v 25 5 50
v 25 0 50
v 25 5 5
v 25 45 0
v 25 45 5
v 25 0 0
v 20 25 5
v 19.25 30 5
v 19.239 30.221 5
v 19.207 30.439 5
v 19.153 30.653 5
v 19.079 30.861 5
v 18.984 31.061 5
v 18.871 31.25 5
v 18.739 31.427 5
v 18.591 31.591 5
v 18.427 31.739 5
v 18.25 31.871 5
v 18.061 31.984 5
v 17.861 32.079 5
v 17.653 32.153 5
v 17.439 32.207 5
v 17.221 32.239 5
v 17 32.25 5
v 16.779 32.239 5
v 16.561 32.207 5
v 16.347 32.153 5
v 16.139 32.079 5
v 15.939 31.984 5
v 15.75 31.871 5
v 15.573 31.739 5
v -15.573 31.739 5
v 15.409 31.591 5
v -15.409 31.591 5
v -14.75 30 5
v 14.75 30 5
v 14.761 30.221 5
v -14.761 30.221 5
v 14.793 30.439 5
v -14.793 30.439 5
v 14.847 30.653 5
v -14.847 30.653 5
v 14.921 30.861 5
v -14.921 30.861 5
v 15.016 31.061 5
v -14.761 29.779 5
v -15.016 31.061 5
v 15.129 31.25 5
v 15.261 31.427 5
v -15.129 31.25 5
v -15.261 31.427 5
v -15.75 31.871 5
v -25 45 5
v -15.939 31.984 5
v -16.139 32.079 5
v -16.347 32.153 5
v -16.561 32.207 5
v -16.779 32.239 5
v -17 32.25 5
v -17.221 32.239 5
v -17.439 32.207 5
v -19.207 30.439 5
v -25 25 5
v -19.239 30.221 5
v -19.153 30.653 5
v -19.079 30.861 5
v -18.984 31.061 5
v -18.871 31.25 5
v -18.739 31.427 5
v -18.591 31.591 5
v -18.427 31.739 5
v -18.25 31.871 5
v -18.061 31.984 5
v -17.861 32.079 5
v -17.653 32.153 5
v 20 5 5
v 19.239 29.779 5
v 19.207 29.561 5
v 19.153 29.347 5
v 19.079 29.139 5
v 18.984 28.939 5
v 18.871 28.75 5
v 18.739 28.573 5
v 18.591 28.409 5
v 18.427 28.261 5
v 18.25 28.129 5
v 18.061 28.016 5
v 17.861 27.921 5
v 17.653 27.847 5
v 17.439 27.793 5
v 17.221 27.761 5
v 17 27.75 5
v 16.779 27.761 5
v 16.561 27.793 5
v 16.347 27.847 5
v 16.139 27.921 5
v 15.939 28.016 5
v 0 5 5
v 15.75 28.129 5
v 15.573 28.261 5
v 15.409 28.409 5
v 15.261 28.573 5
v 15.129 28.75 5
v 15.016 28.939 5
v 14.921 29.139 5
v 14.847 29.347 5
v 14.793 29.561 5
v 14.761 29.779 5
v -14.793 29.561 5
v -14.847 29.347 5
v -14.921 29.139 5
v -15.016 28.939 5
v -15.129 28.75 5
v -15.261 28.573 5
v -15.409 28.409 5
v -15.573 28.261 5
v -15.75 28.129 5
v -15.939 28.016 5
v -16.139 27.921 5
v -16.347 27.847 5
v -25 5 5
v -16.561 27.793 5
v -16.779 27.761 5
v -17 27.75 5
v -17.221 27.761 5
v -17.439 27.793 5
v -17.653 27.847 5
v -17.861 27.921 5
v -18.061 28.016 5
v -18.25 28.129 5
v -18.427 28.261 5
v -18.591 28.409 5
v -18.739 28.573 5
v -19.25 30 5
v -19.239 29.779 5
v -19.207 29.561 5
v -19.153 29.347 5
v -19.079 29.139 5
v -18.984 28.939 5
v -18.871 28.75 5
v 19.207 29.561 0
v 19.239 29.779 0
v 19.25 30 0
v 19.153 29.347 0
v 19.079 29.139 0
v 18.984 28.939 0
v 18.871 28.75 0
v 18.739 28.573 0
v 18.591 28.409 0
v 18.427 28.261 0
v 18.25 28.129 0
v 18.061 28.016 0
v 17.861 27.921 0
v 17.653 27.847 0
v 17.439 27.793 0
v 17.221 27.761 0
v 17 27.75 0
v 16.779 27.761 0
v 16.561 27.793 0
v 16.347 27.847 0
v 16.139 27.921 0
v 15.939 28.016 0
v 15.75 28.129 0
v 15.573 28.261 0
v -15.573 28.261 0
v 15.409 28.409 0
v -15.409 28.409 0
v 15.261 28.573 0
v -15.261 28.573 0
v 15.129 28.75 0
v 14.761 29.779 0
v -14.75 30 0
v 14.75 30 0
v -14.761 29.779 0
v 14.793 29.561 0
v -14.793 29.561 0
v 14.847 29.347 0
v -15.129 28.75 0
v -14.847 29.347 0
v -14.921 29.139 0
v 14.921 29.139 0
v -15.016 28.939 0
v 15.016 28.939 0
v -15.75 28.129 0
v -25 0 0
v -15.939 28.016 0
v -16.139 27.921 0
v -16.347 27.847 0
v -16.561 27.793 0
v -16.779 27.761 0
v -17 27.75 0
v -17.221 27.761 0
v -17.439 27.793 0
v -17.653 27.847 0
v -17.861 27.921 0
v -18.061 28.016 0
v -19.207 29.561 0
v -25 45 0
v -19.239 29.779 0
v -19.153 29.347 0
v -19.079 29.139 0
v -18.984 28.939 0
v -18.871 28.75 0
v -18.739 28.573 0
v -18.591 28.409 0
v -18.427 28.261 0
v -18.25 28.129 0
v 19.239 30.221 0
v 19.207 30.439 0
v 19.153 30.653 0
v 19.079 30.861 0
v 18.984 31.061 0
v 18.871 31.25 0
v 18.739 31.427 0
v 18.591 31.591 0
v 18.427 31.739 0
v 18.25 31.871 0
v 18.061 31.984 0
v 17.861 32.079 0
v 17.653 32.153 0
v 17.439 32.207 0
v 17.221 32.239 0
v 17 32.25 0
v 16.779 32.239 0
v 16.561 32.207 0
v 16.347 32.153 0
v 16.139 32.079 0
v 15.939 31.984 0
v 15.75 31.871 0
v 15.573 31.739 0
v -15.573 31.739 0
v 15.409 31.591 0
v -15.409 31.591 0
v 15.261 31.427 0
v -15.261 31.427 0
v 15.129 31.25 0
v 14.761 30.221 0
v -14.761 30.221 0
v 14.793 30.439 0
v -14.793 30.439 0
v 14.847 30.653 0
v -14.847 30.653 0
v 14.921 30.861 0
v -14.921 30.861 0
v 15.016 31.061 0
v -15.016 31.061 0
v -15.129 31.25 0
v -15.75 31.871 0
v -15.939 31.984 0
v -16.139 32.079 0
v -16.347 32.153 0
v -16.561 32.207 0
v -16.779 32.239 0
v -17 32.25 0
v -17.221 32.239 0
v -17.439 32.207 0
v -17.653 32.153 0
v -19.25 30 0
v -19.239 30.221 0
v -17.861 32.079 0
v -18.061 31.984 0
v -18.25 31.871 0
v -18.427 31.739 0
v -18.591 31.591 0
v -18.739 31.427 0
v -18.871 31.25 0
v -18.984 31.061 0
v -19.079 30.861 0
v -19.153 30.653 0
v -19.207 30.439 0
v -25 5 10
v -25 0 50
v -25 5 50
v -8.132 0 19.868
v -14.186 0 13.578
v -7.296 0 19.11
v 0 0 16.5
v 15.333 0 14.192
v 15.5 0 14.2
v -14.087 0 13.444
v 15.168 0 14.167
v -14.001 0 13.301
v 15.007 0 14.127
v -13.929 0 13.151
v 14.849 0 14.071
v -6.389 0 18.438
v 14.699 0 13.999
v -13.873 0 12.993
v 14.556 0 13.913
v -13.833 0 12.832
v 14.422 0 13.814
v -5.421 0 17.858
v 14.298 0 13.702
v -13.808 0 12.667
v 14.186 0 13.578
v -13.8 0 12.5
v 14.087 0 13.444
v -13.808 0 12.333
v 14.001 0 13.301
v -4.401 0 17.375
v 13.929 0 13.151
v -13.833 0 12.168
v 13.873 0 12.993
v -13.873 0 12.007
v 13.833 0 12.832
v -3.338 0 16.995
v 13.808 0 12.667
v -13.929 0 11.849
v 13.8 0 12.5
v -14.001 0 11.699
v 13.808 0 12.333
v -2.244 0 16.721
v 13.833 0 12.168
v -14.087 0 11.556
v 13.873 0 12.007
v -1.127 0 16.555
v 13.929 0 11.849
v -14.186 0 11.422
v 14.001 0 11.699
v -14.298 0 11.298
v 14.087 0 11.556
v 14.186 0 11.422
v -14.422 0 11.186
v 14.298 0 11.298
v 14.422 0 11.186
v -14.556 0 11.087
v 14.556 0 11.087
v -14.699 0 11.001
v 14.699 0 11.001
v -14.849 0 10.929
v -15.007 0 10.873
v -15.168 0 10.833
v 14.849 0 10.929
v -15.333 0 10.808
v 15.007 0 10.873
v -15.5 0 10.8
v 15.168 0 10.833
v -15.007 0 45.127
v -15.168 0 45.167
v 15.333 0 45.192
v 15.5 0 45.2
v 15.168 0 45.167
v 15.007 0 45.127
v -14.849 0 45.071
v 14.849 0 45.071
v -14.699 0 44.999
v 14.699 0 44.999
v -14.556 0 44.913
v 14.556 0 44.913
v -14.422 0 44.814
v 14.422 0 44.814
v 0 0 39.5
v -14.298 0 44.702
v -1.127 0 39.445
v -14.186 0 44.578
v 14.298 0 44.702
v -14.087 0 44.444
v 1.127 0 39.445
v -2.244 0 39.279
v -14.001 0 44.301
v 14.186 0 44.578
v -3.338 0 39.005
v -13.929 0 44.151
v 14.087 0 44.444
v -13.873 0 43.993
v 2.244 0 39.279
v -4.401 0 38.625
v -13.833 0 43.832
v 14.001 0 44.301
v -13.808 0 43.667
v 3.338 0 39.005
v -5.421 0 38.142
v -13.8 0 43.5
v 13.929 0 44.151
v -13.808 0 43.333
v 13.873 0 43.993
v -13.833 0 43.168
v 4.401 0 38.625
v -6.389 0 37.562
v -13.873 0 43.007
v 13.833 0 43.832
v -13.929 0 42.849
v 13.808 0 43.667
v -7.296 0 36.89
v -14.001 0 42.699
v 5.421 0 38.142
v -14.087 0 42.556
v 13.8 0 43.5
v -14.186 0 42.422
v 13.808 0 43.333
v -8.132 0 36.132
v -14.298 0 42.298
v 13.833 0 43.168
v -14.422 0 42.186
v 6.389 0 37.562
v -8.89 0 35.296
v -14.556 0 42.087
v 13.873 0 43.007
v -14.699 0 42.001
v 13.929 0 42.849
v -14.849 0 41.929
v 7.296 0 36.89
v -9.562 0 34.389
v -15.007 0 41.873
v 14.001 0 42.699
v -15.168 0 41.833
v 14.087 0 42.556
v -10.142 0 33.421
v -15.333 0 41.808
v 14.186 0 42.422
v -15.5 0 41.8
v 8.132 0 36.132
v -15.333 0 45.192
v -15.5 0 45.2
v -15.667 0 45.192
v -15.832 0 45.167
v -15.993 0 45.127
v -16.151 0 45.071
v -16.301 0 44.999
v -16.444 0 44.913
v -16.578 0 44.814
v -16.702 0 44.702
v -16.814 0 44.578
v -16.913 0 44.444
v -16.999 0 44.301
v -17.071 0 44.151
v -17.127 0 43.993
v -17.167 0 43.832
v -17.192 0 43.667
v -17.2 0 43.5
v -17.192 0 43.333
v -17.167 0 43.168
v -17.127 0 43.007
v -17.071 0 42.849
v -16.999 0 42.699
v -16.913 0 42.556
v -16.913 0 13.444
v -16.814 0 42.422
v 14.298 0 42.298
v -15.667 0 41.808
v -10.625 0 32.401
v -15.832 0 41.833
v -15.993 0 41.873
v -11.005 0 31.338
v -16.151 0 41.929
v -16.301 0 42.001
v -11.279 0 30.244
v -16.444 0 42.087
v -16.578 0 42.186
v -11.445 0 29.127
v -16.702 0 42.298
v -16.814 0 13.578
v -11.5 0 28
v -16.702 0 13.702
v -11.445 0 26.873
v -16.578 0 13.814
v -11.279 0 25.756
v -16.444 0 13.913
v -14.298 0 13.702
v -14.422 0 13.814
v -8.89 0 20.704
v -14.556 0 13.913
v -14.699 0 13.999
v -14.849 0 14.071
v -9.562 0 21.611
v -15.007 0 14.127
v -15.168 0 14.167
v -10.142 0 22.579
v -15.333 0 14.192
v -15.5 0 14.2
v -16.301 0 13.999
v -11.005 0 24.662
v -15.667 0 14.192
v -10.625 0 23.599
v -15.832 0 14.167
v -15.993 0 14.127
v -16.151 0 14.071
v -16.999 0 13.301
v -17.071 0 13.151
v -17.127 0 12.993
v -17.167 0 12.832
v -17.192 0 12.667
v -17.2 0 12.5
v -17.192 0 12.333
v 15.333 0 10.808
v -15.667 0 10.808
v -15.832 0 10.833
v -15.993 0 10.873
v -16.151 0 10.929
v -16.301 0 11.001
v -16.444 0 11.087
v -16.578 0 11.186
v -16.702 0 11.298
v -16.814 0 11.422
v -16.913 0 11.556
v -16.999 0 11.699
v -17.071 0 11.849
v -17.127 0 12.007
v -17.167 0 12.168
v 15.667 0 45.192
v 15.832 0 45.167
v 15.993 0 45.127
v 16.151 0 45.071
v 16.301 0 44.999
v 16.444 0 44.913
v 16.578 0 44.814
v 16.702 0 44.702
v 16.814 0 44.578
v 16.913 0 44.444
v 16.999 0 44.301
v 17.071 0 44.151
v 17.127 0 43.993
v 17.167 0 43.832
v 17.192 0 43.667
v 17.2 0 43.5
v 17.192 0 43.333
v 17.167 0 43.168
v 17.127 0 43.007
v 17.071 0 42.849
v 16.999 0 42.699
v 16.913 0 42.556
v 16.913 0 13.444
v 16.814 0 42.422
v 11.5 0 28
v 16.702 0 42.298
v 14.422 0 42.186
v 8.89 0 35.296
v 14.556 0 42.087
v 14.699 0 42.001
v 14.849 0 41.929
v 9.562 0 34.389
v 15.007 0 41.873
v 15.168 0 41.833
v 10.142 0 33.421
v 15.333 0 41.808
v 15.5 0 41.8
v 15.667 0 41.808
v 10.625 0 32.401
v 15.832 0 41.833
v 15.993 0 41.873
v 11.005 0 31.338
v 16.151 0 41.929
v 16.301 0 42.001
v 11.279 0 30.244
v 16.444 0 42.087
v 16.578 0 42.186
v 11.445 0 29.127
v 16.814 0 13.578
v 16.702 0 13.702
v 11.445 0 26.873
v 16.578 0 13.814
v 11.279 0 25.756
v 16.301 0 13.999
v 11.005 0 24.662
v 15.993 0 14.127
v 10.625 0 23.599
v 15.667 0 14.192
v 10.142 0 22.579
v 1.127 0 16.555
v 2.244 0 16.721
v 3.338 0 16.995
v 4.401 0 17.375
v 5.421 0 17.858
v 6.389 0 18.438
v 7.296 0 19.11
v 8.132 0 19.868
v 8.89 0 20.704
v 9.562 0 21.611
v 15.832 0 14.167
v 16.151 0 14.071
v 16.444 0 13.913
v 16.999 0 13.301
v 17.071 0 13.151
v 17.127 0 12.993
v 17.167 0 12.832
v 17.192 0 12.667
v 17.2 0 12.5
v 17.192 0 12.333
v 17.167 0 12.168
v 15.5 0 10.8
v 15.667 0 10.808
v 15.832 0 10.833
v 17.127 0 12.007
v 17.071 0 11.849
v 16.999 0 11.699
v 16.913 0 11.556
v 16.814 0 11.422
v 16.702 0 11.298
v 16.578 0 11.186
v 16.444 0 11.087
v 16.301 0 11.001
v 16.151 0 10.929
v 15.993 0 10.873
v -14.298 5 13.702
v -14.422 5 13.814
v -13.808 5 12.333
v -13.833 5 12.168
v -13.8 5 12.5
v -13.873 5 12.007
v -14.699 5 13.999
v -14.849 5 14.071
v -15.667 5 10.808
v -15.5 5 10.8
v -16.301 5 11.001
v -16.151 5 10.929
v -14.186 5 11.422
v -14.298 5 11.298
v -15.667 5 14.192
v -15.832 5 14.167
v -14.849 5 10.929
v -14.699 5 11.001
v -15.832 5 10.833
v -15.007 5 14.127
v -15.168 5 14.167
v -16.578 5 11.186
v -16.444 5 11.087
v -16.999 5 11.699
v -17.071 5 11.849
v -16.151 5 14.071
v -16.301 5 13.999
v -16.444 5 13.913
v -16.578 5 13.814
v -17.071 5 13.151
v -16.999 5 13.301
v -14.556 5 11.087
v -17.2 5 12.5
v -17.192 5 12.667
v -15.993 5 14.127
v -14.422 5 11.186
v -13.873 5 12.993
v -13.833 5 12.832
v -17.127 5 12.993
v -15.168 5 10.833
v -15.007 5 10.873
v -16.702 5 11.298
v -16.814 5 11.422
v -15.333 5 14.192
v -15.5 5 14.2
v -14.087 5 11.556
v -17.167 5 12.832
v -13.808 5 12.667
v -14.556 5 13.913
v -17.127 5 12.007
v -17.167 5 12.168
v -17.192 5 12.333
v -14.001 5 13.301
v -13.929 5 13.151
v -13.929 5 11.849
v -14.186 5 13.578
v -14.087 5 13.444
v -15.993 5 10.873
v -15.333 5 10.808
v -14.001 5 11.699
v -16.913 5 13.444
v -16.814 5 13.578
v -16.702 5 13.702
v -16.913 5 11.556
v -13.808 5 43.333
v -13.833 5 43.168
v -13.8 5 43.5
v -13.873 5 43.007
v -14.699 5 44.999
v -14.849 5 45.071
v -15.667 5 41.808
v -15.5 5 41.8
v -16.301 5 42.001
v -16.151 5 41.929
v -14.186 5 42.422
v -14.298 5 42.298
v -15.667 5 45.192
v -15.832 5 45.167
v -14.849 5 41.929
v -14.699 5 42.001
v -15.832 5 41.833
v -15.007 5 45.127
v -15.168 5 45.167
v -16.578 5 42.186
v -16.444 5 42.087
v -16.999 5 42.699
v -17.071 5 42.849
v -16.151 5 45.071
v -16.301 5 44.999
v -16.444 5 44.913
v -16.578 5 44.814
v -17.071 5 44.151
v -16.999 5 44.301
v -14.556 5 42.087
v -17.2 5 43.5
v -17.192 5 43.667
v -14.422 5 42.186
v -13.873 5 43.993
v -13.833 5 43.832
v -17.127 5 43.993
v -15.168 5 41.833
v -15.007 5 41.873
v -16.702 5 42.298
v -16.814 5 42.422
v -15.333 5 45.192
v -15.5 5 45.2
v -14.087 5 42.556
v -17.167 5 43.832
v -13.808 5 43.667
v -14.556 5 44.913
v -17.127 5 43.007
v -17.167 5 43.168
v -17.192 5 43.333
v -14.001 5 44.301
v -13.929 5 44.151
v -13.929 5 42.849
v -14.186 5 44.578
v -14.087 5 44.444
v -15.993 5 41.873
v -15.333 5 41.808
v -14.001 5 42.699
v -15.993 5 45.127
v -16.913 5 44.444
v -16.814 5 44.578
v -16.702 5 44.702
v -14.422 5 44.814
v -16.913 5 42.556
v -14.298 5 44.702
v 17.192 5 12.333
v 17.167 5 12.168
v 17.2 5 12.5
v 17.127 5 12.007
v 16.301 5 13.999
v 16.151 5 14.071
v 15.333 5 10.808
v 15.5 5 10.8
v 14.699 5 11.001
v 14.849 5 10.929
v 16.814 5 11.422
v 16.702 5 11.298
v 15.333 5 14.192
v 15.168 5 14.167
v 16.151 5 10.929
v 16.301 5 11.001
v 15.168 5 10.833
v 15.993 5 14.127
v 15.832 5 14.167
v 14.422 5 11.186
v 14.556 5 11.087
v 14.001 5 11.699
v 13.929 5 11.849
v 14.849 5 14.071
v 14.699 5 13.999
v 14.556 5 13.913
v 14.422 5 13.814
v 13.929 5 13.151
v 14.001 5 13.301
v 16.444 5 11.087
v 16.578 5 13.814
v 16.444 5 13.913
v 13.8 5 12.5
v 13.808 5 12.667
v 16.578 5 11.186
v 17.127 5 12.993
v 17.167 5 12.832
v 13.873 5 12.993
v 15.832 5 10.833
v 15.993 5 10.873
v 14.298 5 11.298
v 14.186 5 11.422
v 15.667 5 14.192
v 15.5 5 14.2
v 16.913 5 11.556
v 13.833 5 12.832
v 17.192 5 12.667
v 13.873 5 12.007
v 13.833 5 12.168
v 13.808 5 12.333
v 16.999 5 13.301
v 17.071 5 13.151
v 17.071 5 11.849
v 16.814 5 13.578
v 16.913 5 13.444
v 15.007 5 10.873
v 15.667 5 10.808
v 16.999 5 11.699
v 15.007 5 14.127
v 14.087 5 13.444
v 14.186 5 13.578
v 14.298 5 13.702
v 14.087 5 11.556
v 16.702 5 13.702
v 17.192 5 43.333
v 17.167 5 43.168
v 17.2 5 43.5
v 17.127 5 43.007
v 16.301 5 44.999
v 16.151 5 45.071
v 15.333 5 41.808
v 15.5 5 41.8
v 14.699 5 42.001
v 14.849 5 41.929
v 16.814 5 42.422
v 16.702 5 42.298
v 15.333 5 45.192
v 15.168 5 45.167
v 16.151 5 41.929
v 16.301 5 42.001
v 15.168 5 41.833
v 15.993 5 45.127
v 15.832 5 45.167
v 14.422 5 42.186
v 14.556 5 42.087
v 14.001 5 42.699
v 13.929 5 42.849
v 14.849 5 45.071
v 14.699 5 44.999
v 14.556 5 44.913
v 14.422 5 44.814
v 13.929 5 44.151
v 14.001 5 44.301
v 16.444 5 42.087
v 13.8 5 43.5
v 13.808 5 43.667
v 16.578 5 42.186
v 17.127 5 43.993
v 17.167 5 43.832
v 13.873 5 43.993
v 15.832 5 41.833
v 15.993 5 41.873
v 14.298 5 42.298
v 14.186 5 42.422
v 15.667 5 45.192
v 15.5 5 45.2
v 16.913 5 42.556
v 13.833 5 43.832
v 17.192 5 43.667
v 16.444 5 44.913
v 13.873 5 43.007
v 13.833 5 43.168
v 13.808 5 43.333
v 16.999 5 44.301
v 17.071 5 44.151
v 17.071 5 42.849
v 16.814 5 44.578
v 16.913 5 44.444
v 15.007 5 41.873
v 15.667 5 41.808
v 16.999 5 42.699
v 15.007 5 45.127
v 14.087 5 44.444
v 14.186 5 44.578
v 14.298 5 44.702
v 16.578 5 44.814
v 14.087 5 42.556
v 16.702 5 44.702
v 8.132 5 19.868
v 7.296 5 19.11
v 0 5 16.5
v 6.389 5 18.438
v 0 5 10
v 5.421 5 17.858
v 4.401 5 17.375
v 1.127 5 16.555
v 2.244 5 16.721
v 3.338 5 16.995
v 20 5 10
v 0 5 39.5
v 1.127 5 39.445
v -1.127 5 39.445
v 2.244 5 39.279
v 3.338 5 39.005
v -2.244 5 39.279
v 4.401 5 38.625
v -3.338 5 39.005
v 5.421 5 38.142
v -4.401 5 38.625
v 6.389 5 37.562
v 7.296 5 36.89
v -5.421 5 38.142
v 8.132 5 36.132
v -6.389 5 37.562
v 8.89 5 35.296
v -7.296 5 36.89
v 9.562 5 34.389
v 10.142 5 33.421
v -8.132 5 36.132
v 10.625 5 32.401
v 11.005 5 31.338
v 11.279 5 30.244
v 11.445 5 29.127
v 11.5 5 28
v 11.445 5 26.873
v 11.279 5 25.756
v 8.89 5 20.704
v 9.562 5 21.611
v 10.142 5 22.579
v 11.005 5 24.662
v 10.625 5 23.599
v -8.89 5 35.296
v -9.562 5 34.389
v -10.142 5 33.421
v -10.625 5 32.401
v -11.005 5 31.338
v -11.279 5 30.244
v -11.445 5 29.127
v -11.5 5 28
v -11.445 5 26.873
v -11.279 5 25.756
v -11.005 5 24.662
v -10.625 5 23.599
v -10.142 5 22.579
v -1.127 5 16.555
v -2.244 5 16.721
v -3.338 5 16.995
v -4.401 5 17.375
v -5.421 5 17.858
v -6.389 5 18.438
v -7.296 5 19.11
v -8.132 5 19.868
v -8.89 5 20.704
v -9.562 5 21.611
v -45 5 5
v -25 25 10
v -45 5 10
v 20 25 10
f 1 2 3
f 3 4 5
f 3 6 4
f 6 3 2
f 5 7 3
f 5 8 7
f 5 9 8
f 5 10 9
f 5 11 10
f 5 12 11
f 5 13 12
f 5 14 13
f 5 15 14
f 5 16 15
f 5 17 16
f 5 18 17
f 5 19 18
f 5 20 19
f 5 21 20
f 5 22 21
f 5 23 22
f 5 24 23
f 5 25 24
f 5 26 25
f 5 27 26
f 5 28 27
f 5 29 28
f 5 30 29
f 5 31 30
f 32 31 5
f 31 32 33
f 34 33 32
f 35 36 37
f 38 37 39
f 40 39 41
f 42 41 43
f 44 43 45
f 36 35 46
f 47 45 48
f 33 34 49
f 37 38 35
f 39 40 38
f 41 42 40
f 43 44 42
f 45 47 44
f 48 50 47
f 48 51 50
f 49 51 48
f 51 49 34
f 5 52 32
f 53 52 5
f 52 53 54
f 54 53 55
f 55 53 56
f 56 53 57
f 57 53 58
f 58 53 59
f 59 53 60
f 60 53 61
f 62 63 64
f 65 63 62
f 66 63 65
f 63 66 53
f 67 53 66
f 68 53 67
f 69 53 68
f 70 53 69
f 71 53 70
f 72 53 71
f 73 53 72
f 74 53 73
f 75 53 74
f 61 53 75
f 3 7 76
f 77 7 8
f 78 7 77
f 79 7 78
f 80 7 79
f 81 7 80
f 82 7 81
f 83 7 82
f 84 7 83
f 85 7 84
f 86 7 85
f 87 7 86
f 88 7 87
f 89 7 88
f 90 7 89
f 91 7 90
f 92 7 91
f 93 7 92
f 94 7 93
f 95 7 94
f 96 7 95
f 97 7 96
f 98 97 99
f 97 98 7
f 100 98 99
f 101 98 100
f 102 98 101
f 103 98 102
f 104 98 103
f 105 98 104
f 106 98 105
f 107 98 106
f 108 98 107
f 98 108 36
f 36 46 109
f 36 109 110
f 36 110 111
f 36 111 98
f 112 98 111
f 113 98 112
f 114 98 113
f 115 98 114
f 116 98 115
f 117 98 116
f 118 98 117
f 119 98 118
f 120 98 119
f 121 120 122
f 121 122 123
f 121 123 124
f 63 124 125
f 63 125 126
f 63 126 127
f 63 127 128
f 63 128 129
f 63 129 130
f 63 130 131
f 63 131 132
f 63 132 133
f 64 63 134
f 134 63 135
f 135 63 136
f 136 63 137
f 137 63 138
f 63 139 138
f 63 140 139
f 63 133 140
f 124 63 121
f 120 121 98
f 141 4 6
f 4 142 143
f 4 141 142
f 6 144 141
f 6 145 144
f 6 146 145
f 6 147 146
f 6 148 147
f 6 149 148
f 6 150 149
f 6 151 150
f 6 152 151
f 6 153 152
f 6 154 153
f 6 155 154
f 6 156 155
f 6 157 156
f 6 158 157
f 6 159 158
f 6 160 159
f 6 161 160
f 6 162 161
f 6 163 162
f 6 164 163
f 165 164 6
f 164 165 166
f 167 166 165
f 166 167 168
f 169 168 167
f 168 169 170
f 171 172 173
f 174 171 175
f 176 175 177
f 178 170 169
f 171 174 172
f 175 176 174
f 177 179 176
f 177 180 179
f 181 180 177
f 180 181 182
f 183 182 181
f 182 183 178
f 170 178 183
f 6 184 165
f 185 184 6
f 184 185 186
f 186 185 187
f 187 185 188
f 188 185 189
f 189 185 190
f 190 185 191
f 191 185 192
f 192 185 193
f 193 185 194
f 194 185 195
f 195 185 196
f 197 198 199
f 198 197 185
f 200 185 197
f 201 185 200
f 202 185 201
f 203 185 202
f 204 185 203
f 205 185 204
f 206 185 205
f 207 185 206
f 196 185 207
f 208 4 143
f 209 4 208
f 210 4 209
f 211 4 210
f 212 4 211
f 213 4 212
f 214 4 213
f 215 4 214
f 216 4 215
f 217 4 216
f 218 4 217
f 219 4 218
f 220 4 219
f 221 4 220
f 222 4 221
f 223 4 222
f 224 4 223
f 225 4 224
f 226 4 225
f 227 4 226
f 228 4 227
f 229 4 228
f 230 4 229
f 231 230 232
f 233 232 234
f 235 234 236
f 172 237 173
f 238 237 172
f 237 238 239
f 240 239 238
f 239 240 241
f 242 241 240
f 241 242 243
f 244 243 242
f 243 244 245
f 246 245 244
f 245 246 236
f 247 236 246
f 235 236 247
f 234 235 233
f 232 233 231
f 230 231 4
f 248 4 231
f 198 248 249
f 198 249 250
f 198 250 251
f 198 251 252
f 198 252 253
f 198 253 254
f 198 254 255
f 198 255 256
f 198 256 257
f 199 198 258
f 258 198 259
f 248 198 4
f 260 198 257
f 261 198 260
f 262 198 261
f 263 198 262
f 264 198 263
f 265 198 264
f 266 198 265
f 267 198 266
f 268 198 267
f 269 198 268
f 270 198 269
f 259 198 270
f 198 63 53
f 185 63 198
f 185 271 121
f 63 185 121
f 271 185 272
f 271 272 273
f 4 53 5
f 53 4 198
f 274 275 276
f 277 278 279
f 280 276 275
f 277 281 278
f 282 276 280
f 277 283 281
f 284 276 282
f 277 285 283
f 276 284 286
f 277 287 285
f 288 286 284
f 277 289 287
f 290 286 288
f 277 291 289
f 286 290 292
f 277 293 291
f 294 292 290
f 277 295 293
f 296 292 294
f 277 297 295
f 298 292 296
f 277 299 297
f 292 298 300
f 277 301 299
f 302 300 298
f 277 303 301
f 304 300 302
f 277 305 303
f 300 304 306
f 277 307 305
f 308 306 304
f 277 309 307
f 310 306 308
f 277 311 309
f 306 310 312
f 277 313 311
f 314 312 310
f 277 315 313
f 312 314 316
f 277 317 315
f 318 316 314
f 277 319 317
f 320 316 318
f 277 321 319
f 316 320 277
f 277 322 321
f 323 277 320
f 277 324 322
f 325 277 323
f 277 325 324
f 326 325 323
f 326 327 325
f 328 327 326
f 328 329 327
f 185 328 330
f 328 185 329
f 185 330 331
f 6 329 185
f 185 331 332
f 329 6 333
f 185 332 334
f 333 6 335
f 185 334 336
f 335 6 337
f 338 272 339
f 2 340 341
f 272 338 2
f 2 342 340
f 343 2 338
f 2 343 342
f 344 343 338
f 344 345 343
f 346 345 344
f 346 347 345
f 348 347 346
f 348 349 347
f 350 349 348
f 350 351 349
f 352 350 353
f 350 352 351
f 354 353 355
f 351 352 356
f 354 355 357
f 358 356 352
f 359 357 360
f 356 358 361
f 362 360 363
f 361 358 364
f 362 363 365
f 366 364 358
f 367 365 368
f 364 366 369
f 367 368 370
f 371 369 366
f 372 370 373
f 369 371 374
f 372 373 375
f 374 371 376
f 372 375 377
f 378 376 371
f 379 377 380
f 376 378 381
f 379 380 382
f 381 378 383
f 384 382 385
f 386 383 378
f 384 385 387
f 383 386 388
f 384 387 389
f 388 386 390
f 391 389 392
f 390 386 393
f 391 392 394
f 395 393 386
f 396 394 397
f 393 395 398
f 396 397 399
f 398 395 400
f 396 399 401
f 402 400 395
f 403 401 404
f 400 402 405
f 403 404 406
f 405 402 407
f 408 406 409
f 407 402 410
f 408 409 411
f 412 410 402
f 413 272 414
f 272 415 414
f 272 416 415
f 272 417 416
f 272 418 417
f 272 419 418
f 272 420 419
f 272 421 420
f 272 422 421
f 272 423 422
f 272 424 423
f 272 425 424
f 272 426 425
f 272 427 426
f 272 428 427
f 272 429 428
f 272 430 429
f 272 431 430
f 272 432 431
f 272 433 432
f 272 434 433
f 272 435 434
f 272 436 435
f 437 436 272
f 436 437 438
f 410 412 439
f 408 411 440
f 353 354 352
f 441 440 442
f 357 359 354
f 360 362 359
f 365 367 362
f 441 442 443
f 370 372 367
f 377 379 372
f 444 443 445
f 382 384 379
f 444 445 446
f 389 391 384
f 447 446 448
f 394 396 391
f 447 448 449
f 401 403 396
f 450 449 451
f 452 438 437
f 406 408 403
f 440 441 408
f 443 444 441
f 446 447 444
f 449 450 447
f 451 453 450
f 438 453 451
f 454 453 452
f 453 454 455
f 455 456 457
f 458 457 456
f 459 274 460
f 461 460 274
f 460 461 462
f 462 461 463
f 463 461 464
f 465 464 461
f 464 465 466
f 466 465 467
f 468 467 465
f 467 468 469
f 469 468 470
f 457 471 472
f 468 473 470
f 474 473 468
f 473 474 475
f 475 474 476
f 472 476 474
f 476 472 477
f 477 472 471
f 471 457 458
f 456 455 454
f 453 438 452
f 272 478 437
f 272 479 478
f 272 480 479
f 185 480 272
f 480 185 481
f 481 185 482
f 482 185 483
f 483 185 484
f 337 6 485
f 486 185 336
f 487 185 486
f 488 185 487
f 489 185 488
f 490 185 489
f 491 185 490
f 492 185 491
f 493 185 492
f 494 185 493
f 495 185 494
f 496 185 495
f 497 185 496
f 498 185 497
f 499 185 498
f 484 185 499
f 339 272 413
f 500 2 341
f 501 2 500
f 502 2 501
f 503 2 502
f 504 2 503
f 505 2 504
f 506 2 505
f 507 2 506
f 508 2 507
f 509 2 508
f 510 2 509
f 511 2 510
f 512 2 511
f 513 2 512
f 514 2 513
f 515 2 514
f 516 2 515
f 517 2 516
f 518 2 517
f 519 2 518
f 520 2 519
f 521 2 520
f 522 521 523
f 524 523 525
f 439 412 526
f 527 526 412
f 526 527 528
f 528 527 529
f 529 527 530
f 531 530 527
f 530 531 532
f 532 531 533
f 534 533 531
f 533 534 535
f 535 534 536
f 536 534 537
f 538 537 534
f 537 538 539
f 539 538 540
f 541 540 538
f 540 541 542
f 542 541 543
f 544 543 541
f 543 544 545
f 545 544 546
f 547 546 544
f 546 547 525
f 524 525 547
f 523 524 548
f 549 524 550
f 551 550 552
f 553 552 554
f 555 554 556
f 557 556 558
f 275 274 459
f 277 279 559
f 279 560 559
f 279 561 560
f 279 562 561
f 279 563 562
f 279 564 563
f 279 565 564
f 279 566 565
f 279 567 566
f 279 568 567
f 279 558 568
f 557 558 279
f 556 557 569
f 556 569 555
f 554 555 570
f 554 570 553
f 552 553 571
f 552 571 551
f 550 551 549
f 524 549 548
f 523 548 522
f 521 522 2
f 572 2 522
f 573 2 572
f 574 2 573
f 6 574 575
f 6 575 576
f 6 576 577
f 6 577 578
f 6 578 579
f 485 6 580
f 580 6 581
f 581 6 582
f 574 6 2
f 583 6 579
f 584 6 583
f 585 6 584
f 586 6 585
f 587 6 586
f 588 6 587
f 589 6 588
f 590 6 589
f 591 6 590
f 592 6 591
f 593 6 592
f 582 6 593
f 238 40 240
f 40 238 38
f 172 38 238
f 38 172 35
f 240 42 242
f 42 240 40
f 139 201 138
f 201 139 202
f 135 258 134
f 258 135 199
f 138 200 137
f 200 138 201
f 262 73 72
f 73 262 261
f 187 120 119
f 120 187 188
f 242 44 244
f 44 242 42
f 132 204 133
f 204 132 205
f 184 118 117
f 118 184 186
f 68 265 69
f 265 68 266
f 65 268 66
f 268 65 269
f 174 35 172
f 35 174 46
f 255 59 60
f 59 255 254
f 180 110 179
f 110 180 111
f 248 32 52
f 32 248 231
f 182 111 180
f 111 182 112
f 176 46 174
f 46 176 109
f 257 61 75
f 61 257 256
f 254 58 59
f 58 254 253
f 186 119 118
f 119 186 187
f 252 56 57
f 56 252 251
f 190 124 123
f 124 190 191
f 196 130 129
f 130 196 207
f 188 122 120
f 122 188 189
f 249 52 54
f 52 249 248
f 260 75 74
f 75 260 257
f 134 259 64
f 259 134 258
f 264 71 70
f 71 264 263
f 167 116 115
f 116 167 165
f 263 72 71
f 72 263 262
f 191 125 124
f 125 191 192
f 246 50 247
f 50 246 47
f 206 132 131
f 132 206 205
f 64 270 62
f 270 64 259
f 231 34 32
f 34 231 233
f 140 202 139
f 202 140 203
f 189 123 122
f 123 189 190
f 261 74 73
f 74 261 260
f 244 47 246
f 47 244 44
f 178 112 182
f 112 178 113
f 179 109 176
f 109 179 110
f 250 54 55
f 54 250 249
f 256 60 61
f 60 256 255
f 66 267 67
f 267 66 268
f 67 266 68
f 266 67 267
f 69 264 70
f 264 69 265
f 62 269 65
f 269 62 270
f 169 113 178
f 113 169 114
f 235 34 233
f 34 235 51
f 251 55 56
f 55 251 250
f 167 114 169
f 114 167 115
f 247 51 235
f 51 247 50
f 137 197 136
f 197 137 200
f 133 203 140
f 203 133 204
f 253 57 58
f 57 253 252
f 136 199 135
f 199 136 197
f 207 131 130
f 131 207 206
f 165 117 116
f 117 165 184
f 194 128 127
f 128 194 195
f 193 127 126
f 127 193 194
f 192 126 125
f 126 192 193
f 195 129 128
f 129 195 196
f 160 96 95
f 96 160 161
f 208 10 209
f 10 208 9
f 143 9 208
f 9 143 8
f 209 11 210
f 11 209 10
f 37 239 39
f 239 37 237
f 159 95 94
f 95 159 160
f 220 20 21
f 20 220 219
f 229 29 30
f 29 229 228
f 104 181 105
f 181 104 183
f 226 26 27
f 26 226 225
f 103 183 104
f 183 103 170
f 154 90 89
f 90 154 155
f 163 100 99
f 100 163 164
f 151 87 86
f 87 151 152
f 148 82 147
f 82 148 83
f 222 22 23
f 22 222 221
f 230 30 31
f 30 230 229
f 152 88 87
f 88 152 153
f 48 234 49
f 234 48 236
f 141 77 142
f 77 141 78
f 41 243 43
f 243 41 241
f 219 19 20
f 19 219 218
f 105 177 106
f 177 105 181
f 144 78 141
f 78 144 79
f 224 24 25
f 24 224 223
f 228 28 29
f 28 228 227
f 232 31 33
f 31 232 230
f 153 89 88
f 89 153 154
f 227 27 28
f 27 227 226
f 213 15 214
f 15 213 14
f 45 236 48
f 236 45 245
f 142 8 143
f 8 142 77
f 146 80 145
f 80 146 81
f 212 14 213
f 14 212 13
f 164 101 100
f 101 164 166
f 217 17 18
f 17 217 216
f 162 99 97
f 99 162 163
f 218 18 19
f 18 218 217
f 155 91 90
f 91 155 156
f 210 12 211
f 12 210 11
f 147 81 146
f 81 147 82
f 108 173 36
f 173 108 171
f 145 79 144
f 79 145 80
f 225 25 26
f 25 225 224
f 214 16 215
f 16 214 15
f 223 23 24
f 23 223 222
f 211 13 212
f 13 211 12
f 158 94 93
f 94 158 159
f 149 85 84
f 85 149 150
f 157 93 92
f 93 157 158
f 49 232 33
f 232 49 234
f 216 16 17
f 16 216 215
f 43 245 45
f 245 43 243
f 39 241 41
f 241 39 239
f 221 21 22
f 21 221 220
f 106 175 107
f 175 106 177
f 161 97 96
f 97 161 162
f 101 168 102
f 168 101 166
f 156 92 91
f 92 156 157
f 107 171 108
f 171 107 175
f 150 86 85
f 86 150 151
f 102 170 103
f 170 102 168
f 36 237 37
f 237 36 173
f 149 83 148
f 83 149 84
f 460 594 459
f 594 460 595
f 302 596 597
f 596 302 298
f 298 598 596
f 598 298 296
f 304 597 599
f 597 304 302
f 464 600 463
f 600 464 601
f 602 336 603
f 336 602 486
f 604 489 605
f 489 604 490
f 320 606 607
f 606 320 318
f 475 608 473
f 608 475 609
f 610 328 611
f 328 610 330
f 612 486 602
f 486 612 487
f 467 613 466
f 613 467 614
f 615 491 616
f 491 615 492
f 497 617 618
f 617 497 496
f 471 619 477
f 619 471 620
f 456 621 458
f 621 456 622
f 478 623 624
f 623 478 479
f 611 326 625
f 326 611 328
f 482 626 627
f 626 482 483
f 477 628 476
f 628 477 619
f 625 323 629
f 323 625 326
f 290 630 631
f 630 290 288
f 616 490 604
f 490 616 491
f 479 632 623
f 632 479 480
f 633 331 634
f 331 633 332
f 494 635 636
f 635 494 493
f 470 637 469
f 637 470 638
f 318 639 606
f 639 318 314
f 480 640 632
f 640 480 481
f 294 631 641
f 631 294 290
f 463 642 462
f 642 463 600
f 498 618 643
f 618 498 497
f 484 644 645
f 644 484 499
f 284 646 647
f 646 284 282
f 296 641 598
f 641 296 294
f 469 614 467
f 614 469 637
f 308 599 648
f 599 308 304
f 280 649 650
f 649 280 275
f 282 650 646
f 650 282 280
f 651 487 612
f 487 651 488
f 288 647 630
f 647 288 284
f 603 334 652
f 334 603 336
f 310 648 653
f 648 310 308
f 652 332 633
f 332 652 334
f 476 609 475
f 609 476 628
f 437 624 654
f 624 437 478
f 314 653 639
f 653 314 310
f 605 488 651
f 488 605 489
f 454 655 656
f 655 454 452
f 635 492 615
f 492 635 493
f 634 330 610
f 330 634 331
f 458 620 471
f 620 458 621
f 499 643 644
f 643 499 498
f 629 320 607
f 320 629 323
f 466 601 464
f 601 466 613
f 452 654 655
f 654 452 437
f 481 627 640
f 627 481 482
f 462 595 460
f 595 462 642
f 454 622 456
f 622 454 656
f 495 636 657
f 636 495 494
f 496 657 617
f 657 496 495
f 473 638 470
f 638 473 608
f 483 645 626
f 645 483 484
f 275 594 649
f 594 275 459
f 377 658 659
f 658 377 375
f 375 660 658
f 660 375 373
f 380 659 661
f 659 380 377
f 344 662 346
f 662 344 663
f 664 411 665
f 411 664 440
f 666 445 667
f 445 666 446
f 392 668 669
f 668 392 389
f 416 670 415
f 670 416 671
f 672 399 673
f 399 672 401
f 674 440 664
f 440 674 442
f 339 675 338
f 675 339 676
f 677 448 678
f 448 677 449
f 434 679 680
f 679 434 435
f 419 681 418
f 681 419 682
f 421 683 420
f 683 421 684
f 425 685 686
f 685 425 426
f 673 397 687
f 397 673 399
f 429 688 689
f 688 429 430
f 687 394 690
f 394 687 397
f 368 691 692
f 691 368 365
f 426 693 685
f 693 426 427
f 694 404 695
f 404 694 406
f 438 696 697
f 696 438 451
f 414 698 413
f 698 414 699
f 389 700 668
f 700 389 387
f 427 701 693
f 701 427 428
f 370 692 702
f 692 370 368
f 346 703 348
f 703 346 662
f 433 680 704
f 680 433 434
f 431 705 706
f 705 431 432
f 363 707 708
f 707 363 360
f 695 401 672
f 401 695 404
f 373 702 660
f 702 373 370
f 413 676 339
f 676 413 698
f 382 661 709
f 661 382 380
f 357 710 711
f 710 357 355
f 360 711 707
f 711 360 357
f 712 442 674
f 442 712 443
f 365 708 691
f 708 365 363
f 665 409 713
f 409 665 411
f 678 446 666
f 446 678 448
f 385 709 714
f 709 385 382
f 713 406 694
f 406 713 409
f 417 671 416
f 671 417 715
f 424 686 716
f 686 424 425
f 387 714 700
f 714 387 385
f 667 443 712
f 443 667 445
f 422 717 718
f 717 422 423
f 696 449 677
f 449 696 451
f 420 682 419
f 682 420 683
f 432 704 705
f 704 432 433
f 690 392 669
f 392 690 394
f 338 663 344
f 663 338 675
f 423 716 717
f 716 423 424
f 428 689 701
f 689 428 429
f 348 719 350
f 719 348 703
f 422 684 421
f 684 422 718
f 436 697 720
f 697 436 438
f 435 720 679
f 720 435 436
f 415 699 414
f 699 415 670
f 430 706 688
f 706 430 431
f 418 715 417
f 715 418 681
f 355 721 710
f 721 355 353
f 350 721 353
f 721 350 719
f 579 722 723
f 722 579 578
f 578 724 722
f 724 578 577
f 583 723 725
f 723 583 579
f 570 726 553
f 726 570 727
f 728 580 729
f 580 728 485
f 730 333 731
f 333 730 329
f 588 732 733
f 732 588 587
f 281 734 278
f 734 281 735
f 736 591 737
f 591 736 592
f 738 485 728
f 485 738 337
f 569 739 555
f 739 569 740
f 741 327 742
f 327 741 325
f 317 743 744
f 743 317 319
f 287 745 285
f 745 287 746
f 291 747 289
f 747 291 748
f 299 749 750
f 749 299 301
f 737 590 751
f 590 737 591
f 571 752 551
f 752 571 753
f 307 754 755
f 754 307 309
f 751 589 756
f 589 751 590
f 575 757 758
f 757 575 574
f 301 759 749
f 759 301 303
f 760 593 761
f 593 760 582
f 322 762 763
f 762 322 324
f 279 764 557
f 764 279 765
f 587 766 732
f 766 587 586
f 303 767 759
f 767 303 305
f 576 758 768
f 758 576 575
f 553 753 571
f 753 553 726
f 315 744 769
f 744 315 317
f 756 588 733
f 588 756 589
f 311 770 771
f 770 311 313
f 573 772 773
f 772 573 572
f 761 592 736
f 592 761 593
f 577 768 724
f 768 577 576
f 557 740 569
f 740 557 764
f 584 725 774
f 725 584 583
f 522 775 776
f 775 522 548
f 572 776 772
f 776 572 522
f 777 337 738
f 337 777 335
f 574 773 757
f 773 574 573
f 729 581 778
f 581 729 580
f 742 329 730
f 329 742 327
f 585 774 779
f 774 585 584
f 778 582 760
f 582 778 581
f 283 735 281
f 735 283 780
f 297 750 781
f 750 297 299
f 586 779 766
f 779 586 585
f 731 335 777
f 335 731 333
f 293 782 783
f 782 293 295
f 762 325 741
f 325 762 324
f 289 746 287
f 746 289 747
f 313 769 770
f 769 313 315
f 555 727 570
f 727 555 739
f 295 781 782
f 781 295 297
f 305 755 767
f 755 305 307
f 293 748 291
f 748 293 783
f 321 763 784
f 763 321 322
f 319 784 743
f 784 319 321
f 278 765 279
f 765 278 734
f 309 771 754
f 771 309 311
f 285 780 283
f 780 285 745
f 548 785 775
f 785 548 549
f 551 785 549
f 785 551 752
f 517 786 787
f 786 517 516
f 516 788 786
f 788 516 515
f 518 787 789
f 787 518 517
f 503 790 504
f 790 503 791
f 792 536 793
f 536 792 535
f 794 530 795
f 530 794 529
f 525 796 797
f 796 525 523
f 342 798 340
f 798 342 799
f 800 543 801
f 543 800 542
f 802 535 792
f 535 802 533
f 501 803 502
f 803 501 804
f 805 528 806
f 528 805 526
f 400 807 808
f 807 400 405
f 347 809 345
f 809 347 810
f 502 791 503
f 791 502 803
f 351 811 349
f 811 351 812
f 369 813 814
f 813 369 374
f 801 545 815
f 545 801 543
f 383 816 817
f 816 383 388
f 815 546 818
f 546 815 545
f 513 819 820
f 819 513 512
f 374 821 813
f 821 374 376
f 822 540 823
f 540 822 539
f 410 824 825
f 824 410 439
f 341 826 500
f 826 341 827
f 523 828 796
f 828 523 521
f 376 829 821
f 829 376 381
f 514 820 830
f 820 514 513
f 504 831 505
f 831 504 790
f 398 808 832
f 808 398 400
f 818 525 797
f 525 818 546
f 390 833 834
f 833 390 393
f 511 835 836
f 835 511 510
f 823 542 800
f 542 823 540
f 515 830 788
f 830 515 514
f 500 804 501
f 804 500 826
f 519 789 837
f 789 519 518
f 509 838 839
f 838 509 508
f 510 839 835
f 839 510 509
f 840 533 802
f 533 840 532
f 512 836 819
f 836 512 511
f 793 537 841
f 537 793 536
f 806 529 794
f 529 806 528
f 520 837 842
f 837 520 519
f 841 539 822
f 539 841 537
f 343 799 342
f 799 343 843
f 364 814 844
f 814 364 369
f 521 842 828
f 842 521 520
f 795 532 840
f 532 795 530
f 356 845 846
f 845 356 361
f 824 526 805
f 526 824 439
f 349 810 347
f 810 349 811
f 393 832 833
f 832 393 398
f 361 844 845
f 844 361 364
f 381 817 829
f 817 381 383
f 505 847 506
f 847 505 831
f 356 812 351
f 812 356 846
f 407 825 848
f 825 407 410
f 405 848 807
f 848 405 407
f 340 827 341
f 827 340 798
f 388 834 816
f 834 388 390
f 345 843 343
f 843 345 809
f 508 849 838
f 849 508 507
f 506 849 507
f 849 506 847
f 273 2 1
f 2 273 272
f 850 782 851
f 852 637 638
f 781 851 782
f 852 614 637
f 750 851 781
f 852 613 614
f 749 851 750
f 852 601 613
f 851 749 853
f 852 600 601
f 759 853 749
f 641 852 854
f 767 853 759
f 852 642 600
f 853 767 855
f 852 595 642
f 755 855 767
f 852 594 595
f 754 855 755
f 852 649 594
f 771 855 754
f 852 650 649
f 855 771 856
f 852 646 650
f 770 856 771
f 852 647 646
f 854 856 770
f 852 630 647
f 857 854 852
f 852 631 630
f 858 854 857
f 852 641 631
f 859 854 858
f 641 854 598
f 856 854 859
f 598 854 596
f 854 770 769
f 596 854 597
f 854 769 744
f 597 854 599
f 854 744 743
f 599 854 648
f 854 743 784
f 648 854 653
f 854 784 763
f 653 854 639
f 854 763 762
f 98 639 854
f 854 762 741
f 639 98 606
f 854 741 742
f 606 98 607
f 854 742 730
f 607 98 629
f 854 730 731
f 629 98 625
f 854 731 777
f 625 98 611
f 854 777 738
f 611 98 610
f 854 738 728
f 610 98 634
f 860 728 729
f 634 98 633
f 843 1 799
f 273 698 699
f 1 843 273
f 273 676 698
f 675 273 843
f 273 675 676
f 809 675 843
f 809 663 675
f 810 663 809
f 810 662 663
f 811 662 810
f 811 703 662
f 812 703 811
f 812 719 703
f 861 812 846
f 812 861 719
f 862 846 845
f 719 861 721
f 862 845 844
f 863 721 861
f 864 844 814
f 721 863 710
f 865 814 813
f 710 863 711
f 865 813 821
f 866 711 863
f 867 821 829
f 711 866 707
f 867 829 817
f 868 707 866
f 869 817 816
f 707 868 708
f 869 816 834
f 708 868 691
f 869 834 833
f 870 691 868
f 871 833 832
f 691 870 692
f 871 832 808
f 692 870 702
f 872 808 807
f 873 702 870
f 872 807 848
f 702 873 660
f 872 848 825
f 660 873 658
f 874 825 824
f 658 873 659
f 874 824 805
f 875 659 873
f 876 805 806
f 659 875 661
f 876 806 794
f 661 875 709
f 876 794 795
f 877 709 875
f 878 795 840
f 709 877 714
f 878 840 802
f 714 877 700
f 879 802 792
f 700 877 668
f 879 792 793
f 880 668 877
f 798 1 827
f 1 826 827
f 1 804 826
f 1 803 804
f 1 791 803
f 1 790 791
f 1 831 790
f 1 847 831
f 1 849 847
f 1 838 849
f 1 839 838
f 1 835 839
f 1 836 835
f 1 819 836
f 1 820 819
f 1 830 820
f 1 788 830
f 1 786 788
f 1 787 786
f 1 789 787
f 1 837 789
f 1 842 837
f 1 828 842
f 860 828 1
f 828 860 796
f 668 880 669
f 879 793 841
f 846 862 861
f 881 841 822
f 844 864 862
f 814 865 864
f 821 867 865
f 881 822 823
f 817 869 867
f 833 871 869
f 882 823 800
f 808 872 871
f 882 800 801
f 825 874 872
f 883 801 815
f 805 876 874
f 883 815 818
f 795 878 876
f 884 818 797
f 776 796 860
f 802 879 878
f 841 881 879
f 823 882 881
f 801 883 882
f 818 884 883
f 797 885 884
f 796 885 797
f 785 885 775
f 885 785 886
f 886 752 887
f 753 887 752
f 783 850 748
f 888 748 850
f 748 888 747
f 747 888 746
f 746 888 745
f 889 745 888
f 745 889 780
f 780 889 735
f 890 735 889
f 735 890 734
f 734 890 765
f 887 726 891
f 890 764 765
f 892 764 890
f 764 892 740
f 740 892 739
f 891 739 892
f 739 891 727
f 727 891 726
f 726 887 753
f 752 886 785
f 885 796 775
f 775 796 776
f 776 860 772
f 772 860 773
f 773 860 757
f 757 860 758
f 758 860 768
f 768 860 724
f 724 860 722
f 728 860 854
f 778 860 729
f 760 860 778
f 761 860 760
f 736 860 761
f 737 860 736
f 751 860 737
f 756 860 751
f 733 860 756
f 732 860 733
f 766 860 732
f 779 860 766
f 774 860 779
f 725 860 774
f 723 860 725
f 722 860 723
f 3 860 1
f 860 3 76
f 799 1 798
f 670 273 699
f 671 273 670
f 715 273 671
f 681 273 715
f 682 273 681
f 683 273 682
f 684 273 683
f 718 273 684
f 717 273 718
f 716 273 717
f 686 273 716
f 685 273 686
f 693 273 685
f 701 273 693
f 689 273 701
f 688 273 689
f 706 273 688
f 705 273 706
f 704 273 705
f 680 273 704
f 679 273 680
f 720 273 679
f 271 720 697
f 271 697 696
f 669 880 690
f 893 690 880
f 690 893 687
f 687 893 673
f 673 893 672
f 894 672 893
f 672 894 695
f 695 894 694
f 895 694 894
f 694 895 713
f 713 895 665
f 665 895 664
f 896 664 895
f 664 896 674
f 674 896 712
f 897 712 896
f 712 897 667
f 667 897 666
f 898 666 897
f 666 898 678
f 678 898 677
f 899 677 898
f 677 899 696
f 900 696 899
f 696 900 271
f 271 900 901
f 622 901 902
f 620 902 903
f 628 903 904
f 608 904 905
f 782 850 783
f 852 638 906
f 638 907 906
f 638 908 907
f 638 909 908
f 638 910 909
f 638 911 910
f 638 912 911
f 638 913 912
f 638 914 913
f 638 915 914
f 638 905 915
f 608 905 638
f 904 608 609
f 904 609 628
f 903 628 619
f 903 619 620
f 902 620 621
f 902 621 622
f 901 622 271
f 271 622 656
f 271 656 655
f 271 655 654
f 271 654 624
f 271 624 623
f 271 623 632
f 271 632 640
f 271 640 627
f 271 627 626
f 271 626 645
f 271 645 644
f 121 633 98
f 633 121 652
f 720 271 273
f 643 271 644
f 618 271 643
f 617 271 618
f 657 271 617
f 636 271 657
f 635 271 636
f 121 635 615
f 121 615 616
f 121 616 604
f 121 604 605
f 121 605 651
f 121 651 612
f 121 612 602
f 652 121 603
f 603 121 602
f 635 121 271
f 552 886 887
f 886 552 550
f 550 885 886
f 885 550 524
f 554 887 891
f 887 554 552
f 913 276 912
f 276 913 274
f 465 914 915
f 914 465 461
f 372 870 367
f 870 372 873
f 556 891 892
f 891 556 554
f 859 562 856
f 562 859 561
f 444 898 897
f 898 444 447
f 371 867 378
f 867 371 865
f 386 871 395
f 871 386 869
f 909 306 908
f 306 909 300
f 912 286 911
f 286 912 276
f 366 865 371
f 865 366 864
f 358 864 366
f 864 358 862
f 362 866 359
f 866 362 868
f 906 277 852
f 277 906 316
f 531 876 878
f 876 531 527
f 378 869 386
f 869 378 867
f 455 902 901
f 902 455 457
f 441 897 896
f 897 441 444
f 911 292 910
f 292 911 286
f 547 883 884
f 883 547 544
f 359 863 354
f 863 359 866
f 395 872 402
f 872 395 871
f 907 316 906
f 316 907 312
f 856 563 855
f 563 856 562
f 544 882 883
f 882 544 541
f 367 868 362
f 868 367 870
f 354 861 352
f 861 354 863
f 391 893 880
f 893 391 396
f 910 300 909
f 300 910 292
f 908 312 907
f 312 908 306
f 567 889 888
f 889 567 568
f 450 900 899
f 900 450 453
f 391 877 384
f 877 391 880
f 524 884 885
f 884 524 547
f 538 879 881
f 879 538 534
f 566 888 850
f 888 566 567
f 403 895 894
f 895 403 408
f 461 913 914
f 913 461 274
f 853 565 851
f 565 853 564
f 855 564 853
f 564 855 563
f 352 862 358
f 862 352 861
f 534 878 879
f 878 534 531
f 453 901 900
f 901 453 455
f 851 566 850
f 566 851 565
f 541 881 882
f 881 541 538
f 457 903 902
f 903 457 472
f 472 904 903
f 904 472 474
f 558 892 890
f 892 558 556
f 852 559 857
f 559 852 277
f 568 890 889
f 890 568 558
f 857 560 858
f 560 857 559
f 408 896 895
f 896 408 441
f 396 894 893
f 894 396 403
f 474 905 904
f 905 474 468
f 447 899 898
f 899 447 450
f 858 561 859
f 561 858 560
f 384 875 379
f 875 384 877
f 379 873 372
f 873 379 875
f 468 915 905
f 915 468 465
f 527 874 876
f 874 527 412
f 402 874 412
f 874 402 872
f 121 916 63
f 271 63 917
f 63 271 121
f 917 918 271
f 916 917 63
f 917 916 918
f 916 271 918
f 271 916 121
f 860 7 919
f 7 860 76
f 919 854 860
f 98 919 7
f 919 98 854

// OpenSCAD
// L-Shaped NEMA 17 Motor Bracket for Syringe Pump
// Print Orientation: Base plate on XY plane (Z=0)

// --- Dimensions ---
// Base Plate
base_width_x = 50;           // From -25 to 25
base_depth_y = 45;           // From 0 to 45
base_height_z = 5;           // Thickness of base
base_hole_dia = 4.5;         // M4 through-holes
base_hole_x1 = -17;          // X position of hole 1
base_hole_x2 = 17;           // X position of hole 2
base_hole_y = 30;            // Y position of holes

// Vertical Motor Plate
motor_plate_width_x = 50;    // From -25 to 25
motor_plate_depth_y = 5;     // Thickness of vertical plate
motor_plate_height_z = 50;   // Total height from Z=0
motor_boss_dia = 23;         // Centering boss hole diameter
motor_boss_x = 0;            // Center X
motor_boss_z = 28;           // Center Z
motor_screw_dia = 3.4;       // M3 screw holes
motor_screw_pattern = 31;    // Square pattern for M3 screws

// Gussets
gusset_thickness = 5;        // Thickness of gussets
gusset_leg_y = 20;           // Leg length along Y
gusset_leg_z = 20;           // Leg length along Z
gusset_x_outer = 25;         // Outer edge X
gusset_x_inner = 20;         // Inner edge X

// --- Constants ---
$fn = 64;
eps = 0.1; // Overlap for clean boolean operations

// --- Main Assembly ---

union() {
    // 1. Base Plate
    difference() {
        // Main body: x from -25 to 25, y from 0 to 45, z from 0 to 5
        translate([-base_width_x/2, 0, 0])
            cube([base_width_x, base_depth_y, base_height_z]);
        
        // M4 Through-holes: 4.5 mm vertical through-holes at (x = -17, y = 30) and (x = 17, y = 30)
        translate([base_hole_x1, base_hole_y, -eps])
            cylinder(h = base_height_z + 2*eps, d = base_hole_dia);
        translate([base_hole_x2, base_hole_y, -eps])
            cylinder(h = base_height_z + 2*eps, d = base_hole_dia);
    }

    // 2. Vertical Motor Plate
    difference() {
        // Main body: x from -25 to 25, y from 0 to 5, z from 0 to 50
        translate([-motor_plate_width_x/2, 0, 0])
            cube([motor_plate_width_x, motor_plate_depth_y, motor_plate_height_z]);
        
        // Motor Centering Boss Hole: 23 mm hole, center x=0, z=28, along Y
        translate([motor_boss_x, -eps, motor_boss_z])
            rotate([-90, 0, 0])
            cylinder(h = motor_plate_depth_y + 2*eps, d = motor_boss_dia);
        
        // M3 Screw Holes: 3.4 mm holes on a 31 mm square pattern centered on boss
        for (sx = [-1, 1], sz = [-1, 1]) {
            translate([motor_boss_x + sx * (motor_screw_pattern/2), -eps, motor_boss_z + sz * (motor_screw_pattern/2)])
                rotate([-90, 0, 0])
                cylinder(h = motor_plate_depth_y + 2*eps, d = motor_screw_dia);
        }
    }

    // 3. Gussets
    // Each is a right triangle in the YZ plane with legs 20 mm along +Y and +Z.
    // Right-angle corner at y = 5, z = 5.
    // Flush with the left and right edges (x = -25 to -20 and x = 20 to 25).
    
    // Left Gusset (X: -25 to -20)
    // Extrude along X axis. To do this, we define the triangle in YZ and extrude along X.
    // Since we want it from X=-25 to X=-20, we translate to -25 and extrude 5.
    translate([-25, 5, 5])
    rotate([0, 0, 90]) // Rotate polygon to lie in YZ plane relative to X extrusion
    linear_extrude(height = gusset_thickness)
    polygon(points = [
        [0, 0],               // Corner (Y=5, Z=5)
        [gusset_leg_y, 0],    // End of Y leg
        [0, gusset_leg_z]     // End of Z leg
    ]);

    // Right Gusset (X: 20 to 25)
    translate([20, 5, 5])
    rotate([0, 0, 90])
    linear_extrude(height = gusset_thickness)
    polygon(points = [
        [0, 0],               // Corner (Y=5, Z=5)
        [gusset_leg_y, 0],    // End of Y leg
        [0, gusset_leg_z]     // End of Z leg
    ]);
}
